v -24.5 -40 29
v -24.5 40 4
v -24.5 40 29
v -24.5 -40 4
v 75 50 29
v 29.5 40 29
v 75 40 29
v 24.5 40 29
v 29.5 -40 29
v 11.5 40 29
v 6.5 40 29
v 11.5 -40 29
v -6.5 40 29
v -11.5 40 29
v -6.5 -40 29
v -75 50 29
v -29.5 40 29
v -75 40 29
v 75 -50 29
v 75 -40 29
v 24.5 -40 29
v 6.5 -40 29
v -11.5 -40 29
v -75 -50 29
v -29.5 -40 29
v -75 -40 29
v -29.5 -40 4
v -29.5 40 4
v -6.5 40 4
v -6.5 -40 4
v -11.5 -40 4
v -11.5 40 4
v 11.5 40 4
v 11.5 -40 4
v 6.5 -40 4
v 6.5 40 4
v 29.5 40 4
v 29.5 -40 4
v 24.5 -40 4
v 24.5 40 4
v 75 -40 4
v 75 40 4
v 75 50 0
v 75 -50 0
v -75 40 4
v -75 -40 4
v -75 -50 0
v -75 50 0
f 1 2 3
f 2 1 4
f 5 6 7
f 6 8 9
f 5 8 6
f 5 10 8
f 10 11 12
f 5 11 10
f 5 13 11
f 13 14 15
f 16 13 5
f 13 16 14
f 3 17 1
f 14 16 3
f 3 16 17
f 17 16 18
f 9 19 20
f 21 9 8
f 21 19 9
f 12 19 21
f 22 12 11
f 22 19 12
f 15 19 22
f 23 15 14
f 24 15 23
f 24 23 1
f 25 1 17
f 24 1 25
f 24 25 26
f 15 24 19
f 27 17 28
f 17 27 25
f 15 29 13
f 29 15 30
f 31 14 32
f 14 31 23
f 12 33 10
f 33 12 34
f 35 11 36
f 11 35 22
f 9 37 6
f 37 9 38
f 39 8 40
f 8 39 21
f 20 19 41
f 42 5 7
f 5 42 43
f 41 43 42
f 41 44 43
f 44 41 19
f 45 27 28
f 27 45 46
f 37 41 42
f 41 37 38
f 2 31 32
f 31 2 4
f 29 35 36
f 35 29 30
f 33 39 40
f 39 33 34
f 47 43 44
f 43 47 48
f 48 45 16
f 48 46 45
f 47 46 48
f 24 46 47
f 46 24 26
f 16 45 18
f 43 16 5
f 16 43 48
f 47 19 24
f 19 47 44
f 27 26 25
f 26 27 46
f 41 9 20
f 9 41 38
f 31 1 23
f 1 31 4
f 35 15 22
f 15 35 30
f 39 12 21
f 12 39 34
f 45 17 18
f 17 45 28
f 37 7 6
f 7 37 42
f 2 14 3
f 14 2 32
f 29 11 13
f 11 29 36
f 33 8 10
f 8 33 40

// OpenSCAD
$fn = 32;

// ----------------------------------------------------------------------
// Rib frame 150 x 100 x 29
// 4 ribs at 18 mm pitch
// ----------------------------------------------------------------------

// --- parameters (mm) ---
frame = [150, 100, 4];  // base plate size (x, y, z)
rail_w = 10;            // side rail width
ribs = 4;               // number of ribs
rib_t = 5;              // rib thickness
rib_h = 25;             // rib height above the base plate
pitch = 18;             // pitch between rib centres

// --- derived feature positions (mm) ---
span = (ribs - 1) * pitch;          // = 54   distance between the outer ribs
origin_x = -span / 2;               // = -27   X of the first rib
rib_len = frame[1] - 2 * rail_w + 2;  // = 82   rib length, 1 mm into each rail
feature_centers = [
  [origin_x + 0 * pitch, 0],
  [origin_x + 1 * pitch, 0],
  [origin_x + 2 * pitch, 0],
  [origin_x + 3 * pitch, 0]
];   // rib centre line, drives the rib loop

// base plate, two side rails, then the ribs read straight off feature_centers
union() {
  translate([-frame[0] / 2, -frame[1] / 2, 0]) cube(frame);
  translate([-frame[0] / 2, -frame[1] / 2, 0]) cube([frame[0], rail_w, frame[2] + rib_h]);
  translate([-frame[0] / 2, frame[1] / 2 - rail_w, 0]) cube([frame[0], rail_w, frame[2] + rib_h]);
  for (centre = feature_centers)
    translate([centre[0] - rib_t / 2, centre[1] - rib_len / 2, frame[2] - 1])
      cube([rib_t, rib_len, rib_h + 1]);
}
